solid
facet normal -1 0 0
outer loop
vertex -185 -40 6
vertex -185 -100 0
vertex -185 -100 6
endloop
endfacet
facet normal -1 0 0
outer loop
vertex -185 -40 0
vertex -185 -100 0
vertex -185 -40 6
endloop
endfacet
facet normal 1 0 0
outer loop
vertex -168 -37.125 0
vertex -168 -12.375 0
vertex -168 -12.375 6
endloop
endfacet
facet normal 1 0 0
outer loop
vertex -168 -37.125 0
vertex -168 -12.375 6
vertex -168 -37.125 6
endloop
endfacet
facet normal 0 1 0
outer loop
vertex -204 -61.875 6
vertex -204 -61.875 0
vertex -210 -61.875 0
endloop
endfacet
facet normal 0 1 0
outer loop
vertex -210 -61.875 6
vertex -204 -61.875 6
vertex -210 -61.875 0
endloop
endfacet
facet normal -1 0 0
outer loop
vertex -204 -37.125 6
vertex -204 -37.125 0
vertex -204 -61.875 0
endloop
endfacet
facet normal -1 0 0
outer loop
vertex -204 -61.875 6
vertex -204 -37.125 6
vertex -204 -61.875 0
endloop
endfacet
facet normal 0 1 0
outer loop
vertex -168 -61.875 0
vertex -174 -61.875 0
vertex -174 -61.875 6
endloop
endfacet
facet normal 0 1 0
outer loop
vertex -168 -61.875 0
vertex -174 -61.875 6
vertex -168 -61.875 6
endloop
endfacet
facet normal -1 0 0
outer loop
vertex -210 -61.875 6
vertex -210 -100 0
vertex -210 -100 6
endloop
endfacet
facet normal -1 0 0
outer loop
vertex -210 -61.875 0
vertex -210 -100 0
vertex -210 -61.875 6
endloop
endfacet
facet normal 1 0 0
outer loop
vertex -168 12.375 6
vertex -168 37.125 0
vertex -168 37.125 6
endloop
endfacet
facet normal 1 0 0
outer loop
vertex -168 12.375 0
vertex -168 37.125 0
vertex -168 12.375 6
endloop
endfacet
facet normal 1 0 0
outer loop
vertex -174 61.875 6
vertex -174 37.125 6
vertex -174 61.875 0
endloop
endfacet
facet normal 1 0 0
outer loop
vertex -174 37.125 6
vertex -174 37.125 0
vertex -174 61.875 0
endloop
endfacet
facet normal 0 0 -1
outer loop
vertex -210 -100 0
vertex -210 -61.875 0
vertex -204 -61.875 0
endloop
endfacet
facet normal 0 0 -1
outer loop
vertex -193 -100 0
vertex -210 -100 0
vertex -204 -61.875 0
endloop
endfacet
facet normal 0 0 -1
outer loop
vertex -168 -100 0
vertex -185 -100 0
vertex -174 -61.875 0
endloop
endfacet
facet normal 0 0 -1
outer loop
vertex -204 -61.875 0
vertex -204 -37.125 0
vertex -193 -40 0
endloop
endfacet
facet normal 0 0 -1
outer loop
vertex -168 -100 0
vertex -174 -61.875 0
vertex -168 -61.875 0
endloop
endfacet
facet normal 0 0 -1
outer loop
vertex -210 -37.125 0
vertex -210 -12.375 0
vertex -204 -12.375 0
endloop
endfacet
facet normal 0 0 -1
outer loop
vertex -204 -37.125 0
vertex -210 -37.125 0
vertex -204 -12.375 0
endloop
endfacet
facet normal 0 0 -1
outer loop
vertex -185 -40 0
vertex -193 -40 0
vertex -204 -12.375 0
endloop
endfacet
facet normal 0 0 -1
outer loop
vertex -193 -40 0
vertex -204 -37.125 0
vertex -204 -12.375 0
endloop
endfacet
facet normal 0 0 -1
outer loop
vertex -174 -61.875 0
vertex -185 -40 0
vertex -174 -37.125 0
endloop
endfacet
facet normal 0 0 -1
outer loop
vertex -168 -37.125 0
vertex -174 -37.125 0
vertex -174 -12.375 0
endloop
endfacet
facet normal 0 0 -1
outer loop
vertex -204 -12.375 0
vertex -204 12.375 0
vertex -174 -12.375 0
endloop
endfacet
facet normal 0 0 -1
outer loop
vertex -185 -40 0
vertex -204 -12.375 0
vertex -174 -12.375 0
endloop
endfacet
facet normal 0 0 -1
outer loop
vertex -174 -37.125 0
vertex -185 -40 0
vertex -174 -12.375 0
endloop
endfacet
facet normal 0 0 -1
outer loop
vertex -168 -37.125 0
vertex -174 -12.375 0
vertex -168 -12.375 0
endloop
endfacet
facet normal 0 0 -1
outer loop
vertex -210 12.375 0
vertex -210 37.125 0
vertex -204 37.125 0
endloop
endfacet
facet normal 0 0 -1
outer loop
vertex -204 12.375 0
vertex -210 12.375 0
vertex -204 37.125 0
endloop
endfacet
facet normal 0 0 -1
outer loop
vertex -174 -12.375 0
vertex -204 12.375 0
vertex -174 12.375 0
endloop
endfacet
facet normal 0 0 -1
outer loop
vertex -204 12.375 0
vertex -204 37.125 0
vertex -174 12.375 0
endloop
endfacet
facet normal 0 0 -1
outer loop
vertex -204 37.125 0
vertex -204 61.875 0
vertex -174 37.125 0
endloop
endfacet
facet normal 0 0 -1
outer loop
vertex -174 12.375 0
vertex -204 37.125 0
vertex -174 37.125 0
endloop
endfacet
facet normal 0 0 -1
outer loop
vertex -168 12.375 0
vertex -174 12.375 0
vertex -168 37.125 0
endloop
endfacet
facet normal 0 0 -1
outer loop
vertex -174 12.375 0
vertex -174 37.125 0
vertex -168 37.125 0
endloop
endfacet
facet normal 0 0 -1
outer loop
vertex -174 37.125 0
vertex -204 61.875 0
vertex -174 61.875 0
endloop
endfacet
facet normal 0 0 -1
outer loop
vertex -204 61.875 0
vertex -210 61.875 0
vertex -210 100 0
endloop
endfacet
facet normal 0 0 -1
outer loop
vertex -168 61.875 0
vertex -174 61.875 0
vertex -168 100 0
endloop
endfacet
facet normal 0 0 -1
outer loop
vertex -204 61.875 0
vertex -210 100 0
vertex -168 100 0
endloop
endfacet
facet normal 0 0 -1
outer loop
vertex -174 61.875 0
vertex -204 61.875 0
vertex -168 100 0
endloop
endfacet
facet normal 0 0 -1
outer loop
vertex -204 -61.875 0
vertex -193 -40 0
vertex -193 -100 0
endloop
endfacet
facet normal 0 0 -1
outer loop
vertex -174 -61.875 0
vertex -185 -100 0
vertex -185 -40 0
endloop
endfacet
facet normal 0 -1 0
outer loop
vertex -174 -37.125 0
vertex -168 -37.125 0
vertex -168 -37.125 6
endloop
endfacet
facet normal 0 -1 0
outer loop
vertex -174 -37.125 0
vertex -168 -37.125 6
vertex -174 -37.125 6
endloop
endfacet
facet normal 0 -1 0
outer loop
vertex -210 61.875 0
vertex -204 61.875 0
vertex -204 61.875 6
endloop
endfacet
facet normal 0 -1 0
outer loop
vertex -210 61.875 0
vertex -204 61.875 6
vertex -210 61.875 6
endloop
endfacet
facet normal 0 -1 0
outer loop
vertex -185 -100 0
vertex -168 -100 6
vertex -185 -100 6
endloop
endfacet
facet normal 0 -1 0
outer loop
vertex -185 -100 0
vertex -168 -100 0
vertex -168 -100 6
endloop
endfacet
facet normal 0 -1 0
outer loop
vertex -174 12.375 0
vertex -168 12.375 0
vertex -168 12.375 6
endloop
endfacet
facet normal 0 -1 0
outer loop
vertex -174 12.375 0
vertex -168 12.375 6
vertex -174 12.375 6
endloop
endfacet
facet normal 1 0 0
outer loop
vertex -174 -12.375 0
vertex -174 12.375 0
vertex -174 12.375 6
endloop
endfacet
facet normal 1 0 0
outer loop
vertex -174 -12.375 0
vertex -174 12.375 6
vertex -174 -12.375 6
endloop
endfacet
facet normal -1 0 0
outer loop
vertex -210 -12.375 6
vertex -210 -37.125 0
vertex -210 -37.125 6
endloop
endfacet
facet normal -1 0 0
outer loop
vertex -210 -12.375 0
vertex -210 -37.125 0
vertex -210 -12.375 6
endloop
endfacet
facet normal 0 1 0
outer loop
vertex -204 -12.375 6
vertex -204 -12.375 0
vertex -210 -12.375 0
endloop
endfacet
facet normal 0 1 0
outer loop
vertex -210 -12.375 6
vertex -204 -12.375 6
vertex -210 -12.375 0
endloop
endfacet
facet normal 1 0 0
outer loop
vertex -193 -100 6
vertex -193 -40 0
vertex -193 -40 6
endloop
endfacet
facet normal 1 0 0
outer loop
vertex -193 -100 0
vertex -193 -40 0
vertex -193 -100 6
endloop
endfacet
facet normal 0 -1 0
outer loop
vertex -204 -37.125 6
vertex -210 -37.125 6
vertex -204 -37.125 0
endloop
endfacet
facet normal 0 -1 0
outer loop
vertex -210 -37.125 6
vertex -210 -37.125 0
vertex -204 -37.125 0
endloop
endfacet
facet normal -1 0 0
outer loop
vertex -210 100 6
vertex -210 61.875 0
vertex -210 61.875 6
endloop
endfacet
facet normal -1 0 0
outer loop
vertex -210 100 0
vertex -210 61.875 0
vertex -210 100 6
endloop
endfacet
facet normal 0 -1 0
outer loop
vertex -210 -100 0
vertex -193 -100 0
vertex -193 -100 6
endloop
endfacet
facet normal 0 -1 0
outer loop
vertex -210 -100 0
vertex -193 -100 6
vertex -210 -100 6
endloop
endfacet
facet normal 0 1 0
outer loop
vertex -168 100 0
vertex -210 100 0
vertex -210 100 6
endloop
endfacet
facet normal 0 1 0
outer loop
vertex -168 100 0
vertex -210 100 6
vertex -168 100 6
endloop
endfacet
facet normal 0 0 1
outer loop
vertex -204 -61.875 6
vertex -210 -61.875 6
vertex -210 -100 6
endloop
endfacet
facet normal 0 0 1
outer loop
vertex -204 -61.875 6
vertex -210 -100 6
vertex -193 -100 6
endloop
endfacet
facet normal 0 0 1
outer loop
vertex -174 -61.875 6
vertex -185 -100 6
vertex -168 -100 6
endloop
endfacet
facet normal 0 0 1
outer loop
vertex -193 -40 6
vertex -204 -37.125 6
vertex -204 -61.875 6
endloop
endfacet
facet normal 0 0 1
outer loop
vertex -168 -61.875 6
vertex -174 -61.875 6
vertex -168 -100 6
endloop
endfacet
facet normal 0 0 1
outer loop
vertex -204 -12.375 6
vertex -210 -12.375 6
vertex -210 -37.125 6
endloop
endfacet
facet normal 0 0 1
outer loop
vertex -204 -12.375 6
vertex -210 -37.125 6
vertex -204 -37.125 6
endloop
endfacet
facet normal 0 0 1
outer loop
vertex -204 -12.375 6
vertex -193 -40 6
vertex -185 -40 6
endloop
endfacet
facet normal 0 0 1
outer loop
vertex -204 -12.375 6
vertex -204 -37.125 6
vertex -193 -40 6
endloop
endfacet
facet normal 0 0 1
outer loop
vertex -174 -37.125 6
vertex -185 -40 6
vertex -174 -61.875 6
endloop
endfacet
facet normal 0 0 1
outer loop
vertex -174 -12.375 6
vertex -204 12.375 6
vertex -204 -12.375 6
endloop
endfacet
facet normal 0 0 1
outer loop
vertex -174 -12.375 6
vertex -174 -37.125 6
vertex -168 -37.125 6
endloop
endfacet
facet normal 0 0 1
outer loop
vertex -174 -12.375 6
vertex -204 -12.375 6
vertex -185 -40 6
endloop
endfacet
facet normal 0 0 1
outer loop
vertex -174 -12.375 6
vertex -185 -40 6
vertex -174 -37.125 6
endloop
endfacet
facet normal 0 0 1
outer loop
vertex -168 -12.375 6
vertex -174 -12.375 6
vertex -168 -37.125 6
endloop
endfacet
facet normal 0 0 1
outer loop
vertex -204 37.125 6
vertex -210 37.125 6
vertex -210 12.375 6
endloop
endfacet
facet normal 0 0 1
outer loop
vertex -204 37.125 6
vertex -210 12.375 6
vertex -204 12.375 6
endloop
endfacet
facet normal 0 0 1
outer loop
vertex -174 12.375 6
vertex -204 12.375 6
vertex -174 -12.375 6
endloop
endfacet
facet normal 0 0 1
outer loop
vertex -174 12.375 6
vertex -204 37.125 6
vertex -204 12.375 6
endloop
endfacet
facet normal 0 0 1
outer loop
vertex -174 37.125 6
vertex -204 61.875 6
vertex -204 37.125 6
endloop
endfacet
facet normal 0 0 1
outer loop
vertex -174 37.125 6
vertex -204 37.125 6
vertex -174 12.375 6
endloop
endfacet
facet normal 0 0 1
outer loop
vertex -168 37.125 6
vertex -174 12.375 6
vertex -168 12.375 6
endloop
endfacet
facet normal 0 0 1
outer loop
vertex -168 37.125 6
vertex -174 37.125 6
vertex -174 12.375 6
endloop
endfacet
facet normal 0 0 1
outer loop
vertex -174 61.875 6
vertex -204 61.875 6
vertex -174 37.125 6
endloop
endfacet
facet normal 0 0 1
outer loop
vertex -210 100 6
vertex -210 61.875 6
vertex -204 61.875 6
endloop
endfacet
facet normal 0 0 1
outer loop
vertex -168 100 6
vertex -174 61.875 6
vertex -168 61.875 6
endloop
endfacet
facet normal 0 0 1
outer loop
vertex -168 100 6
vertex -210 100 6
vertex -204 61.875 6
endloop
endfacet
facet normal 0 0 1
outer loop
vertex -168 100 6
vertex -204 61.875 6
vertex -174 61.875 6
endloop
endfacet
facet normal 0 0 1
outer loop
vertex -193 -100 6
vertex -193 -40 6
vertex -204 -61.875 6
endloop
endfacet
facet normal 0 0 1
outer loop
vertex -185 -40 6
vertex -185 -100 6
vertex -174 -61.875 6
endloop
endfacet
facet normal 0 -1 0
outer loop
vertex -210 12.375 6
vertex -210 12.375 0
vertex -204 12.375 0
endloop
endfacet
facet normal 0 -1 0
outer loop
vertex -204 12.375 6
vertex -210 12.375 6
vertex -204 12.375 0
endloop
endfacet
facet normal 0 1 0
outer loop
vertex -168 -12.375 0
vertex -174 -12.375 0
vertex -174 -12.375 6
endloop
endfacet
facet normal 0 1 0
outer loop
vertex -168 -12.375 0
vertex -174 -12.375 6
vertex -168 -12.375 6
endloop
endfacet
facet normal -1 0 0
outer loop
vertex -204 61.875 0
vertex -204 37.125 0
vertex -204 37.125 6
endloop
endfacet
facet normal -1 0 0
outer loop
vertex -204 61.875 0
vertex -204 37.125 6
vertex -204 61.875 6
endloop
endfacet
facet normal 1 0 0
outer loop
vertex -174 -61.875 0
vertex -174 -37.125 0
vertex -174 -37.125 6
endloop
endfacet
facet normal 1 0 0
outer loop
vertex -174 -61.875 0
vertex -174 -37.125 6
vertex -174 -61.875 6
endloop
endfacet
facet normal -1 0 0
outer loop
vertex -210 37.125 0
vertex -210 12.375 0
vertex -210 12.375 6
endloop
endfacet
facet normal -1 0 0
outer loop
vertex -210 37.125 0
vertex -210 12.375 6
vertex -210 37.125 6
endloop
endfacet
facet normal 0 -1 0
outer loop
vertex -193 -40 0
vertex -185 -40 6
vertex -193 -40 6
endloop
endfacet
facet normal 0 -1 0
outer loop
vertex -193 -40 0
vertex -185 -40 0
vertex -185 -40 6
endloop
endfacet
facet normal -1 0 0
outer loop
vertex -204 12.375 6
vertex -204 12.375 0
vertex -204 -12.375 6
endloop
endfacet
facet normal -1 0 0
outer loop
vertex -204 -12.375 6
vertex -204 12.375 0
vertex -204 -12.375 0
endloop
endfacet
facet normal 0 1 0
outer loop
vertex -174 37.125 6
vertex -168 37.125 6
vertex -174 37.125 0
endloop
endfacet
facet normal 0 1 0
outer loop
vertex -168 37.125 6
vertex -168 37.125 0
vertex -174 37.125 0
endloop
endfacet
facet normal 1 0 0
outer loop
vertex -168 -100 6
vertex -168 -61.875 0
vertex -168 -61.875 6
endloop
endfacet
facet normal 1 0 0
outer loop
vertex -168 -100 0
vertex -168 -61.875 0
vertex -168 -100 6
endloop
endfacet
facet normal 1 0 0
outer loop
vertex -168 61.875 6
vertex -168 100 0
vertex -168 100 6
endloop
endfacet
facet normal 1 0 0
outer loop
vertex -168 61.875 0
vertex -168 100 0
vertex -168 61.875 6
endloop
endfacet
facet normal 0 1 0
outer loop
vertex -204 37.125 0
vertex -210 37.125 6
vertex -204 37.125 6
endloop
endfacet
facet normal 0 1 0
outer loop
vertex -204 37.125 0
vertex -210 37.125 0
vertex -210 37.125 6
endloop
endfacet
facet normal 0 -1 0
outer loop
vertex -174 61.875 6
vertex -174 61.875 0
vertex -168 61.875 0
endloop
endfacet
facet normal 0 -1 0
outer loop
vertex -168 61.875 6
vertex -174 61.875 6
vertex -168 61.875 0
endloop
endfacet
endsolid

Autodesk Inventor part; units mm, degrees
ref_plane "YZ Plane" through (0, 0, 0) normal (1, 0, 0) x (0, 1, 0)
ref_plane "XZ Plane" through (0, 0, 0) normal (0, 1, 0) x (-1, 0, 0)
ref_plane "XY Plane" through (0, 0, 0) normal (0, 0, 1) x (1, 0, 0)
sketch "Sketch1" plane through (0, 0, 0) normal (0, 0, 1) x (1, 0, 0)
  line L0 (-168, -100) -> (-210, -100)
  line L1 (-210, -100) -> (-210, 100)
  line L2 (-210, 100) -> (-168, 100)
  line L3 (-168, 100) -> (-168, -100)
  line L4 (-168, -100) -> (-210, 100) construction
  line L5 (-210, -100) -> (-168, 100) construction
  line L6 (-168, 0) -> (-168, 12.375)
  line L7 (-168, 12.375) -> (-174, 12.375)
  line L8 (-174, 12.375) -> (-174, -12.375)
  line L9 (-174, -12.375) -> (-168, -12.375)
  line L10 (-168, 12.375) -> (-168, 37.125)
  line L11 (-168, 37.125) -> (-174, 37.125)
  line L12 (-174, 37.125) -> (-174, 61.875)
  line L13 (-174, 61.875) -> (-168, 61.875)
  line L14 (-168, -12.375) -> (-168, -37.125)
  line L15 (-168, -37.125) -> (-174, -37.125)
  line L16 (-174, -37.125) -> (-174, -61.875)
  line L17 (-174, -61.875) -> (-168, -61.875)
  line L18 (-189, 0) -> (-189, 100)
  line L19 (-189, 0) -> (-173.1792, 0)
  line L20 (-210, 12.375) -> (-204, 12.375)
  line L21 (-204, 12.375) -> (-204, -12.375)
  line L22 (-204, -12.375) -> (-210, -12.375)
  line L23 (-210, 37.125) -> (-204, 37.125)
  line L24 (-204, 37.125) -> (-204, 61.875)
  line L25 (-204, 61.875) -> (-210, 61.875)
  line L26 (-210, -37.125) -> (-204, -37.125)
  line L27 (-204, -37.125) -> (-204, -61.875)
  line L28 (-204, -61.875) -> (-210, -61.875)
  line L29 (-185, -40) -> (-193, -40)
  line L30 (-193, -40) -> (-193, -100)
  line L31 (-193, -100) -> (-185, -100)
  line L32 (-185, -100) -> (-185, -40)
  line L33 (-185, -40) -> (-193, -100) construction
  line L34 (-193, -40) -> (-185, -100) construction
  point P0 (-210, 61.875)
  point P1 (-210, 37.125)
  point P2 (-210, 12.375)
  point P3 (-210, -12.375)
  point P4 (-210, -37.125)
  point P5 (-210, -61.875)
  point P6 (-189, -70)
  dimension "d18" = 42
  dimension "d19" = 200
  dimension "d20" = 12.375
  dimension "d21" = 6
  dimension "d22" = 24.75
  dimension "d23" = 24.75
  dimension "d24" = 6
  dimension "d25" = 24.75
  dimension "d26" = 24.75
  dimension "d27" = 6
  dimension "d28" = 24.75
  dimension "d31" = 8
  dimension "d32" = 60
  dimension "d34" = 0
  dimension "d35" = 21
extrude "Extrusion1" add sketch "Sketch1" along normal blind 6 contours L0 L32 L29 L30 L1 L28 L27 L26 L22 L21 L20 L23 L24 L25 L2 L18 L19 L8 L9 L3 L15 L16 L17 | L0 L30 L29 L32 | L7 L8 L19 L18 L2 L3 L13 L12 L11
extrude "Extrusion2" cut sketch "Sketch1" along normal blind 10 contours L0 L30 L29 L32
properties part number "Base_1"
